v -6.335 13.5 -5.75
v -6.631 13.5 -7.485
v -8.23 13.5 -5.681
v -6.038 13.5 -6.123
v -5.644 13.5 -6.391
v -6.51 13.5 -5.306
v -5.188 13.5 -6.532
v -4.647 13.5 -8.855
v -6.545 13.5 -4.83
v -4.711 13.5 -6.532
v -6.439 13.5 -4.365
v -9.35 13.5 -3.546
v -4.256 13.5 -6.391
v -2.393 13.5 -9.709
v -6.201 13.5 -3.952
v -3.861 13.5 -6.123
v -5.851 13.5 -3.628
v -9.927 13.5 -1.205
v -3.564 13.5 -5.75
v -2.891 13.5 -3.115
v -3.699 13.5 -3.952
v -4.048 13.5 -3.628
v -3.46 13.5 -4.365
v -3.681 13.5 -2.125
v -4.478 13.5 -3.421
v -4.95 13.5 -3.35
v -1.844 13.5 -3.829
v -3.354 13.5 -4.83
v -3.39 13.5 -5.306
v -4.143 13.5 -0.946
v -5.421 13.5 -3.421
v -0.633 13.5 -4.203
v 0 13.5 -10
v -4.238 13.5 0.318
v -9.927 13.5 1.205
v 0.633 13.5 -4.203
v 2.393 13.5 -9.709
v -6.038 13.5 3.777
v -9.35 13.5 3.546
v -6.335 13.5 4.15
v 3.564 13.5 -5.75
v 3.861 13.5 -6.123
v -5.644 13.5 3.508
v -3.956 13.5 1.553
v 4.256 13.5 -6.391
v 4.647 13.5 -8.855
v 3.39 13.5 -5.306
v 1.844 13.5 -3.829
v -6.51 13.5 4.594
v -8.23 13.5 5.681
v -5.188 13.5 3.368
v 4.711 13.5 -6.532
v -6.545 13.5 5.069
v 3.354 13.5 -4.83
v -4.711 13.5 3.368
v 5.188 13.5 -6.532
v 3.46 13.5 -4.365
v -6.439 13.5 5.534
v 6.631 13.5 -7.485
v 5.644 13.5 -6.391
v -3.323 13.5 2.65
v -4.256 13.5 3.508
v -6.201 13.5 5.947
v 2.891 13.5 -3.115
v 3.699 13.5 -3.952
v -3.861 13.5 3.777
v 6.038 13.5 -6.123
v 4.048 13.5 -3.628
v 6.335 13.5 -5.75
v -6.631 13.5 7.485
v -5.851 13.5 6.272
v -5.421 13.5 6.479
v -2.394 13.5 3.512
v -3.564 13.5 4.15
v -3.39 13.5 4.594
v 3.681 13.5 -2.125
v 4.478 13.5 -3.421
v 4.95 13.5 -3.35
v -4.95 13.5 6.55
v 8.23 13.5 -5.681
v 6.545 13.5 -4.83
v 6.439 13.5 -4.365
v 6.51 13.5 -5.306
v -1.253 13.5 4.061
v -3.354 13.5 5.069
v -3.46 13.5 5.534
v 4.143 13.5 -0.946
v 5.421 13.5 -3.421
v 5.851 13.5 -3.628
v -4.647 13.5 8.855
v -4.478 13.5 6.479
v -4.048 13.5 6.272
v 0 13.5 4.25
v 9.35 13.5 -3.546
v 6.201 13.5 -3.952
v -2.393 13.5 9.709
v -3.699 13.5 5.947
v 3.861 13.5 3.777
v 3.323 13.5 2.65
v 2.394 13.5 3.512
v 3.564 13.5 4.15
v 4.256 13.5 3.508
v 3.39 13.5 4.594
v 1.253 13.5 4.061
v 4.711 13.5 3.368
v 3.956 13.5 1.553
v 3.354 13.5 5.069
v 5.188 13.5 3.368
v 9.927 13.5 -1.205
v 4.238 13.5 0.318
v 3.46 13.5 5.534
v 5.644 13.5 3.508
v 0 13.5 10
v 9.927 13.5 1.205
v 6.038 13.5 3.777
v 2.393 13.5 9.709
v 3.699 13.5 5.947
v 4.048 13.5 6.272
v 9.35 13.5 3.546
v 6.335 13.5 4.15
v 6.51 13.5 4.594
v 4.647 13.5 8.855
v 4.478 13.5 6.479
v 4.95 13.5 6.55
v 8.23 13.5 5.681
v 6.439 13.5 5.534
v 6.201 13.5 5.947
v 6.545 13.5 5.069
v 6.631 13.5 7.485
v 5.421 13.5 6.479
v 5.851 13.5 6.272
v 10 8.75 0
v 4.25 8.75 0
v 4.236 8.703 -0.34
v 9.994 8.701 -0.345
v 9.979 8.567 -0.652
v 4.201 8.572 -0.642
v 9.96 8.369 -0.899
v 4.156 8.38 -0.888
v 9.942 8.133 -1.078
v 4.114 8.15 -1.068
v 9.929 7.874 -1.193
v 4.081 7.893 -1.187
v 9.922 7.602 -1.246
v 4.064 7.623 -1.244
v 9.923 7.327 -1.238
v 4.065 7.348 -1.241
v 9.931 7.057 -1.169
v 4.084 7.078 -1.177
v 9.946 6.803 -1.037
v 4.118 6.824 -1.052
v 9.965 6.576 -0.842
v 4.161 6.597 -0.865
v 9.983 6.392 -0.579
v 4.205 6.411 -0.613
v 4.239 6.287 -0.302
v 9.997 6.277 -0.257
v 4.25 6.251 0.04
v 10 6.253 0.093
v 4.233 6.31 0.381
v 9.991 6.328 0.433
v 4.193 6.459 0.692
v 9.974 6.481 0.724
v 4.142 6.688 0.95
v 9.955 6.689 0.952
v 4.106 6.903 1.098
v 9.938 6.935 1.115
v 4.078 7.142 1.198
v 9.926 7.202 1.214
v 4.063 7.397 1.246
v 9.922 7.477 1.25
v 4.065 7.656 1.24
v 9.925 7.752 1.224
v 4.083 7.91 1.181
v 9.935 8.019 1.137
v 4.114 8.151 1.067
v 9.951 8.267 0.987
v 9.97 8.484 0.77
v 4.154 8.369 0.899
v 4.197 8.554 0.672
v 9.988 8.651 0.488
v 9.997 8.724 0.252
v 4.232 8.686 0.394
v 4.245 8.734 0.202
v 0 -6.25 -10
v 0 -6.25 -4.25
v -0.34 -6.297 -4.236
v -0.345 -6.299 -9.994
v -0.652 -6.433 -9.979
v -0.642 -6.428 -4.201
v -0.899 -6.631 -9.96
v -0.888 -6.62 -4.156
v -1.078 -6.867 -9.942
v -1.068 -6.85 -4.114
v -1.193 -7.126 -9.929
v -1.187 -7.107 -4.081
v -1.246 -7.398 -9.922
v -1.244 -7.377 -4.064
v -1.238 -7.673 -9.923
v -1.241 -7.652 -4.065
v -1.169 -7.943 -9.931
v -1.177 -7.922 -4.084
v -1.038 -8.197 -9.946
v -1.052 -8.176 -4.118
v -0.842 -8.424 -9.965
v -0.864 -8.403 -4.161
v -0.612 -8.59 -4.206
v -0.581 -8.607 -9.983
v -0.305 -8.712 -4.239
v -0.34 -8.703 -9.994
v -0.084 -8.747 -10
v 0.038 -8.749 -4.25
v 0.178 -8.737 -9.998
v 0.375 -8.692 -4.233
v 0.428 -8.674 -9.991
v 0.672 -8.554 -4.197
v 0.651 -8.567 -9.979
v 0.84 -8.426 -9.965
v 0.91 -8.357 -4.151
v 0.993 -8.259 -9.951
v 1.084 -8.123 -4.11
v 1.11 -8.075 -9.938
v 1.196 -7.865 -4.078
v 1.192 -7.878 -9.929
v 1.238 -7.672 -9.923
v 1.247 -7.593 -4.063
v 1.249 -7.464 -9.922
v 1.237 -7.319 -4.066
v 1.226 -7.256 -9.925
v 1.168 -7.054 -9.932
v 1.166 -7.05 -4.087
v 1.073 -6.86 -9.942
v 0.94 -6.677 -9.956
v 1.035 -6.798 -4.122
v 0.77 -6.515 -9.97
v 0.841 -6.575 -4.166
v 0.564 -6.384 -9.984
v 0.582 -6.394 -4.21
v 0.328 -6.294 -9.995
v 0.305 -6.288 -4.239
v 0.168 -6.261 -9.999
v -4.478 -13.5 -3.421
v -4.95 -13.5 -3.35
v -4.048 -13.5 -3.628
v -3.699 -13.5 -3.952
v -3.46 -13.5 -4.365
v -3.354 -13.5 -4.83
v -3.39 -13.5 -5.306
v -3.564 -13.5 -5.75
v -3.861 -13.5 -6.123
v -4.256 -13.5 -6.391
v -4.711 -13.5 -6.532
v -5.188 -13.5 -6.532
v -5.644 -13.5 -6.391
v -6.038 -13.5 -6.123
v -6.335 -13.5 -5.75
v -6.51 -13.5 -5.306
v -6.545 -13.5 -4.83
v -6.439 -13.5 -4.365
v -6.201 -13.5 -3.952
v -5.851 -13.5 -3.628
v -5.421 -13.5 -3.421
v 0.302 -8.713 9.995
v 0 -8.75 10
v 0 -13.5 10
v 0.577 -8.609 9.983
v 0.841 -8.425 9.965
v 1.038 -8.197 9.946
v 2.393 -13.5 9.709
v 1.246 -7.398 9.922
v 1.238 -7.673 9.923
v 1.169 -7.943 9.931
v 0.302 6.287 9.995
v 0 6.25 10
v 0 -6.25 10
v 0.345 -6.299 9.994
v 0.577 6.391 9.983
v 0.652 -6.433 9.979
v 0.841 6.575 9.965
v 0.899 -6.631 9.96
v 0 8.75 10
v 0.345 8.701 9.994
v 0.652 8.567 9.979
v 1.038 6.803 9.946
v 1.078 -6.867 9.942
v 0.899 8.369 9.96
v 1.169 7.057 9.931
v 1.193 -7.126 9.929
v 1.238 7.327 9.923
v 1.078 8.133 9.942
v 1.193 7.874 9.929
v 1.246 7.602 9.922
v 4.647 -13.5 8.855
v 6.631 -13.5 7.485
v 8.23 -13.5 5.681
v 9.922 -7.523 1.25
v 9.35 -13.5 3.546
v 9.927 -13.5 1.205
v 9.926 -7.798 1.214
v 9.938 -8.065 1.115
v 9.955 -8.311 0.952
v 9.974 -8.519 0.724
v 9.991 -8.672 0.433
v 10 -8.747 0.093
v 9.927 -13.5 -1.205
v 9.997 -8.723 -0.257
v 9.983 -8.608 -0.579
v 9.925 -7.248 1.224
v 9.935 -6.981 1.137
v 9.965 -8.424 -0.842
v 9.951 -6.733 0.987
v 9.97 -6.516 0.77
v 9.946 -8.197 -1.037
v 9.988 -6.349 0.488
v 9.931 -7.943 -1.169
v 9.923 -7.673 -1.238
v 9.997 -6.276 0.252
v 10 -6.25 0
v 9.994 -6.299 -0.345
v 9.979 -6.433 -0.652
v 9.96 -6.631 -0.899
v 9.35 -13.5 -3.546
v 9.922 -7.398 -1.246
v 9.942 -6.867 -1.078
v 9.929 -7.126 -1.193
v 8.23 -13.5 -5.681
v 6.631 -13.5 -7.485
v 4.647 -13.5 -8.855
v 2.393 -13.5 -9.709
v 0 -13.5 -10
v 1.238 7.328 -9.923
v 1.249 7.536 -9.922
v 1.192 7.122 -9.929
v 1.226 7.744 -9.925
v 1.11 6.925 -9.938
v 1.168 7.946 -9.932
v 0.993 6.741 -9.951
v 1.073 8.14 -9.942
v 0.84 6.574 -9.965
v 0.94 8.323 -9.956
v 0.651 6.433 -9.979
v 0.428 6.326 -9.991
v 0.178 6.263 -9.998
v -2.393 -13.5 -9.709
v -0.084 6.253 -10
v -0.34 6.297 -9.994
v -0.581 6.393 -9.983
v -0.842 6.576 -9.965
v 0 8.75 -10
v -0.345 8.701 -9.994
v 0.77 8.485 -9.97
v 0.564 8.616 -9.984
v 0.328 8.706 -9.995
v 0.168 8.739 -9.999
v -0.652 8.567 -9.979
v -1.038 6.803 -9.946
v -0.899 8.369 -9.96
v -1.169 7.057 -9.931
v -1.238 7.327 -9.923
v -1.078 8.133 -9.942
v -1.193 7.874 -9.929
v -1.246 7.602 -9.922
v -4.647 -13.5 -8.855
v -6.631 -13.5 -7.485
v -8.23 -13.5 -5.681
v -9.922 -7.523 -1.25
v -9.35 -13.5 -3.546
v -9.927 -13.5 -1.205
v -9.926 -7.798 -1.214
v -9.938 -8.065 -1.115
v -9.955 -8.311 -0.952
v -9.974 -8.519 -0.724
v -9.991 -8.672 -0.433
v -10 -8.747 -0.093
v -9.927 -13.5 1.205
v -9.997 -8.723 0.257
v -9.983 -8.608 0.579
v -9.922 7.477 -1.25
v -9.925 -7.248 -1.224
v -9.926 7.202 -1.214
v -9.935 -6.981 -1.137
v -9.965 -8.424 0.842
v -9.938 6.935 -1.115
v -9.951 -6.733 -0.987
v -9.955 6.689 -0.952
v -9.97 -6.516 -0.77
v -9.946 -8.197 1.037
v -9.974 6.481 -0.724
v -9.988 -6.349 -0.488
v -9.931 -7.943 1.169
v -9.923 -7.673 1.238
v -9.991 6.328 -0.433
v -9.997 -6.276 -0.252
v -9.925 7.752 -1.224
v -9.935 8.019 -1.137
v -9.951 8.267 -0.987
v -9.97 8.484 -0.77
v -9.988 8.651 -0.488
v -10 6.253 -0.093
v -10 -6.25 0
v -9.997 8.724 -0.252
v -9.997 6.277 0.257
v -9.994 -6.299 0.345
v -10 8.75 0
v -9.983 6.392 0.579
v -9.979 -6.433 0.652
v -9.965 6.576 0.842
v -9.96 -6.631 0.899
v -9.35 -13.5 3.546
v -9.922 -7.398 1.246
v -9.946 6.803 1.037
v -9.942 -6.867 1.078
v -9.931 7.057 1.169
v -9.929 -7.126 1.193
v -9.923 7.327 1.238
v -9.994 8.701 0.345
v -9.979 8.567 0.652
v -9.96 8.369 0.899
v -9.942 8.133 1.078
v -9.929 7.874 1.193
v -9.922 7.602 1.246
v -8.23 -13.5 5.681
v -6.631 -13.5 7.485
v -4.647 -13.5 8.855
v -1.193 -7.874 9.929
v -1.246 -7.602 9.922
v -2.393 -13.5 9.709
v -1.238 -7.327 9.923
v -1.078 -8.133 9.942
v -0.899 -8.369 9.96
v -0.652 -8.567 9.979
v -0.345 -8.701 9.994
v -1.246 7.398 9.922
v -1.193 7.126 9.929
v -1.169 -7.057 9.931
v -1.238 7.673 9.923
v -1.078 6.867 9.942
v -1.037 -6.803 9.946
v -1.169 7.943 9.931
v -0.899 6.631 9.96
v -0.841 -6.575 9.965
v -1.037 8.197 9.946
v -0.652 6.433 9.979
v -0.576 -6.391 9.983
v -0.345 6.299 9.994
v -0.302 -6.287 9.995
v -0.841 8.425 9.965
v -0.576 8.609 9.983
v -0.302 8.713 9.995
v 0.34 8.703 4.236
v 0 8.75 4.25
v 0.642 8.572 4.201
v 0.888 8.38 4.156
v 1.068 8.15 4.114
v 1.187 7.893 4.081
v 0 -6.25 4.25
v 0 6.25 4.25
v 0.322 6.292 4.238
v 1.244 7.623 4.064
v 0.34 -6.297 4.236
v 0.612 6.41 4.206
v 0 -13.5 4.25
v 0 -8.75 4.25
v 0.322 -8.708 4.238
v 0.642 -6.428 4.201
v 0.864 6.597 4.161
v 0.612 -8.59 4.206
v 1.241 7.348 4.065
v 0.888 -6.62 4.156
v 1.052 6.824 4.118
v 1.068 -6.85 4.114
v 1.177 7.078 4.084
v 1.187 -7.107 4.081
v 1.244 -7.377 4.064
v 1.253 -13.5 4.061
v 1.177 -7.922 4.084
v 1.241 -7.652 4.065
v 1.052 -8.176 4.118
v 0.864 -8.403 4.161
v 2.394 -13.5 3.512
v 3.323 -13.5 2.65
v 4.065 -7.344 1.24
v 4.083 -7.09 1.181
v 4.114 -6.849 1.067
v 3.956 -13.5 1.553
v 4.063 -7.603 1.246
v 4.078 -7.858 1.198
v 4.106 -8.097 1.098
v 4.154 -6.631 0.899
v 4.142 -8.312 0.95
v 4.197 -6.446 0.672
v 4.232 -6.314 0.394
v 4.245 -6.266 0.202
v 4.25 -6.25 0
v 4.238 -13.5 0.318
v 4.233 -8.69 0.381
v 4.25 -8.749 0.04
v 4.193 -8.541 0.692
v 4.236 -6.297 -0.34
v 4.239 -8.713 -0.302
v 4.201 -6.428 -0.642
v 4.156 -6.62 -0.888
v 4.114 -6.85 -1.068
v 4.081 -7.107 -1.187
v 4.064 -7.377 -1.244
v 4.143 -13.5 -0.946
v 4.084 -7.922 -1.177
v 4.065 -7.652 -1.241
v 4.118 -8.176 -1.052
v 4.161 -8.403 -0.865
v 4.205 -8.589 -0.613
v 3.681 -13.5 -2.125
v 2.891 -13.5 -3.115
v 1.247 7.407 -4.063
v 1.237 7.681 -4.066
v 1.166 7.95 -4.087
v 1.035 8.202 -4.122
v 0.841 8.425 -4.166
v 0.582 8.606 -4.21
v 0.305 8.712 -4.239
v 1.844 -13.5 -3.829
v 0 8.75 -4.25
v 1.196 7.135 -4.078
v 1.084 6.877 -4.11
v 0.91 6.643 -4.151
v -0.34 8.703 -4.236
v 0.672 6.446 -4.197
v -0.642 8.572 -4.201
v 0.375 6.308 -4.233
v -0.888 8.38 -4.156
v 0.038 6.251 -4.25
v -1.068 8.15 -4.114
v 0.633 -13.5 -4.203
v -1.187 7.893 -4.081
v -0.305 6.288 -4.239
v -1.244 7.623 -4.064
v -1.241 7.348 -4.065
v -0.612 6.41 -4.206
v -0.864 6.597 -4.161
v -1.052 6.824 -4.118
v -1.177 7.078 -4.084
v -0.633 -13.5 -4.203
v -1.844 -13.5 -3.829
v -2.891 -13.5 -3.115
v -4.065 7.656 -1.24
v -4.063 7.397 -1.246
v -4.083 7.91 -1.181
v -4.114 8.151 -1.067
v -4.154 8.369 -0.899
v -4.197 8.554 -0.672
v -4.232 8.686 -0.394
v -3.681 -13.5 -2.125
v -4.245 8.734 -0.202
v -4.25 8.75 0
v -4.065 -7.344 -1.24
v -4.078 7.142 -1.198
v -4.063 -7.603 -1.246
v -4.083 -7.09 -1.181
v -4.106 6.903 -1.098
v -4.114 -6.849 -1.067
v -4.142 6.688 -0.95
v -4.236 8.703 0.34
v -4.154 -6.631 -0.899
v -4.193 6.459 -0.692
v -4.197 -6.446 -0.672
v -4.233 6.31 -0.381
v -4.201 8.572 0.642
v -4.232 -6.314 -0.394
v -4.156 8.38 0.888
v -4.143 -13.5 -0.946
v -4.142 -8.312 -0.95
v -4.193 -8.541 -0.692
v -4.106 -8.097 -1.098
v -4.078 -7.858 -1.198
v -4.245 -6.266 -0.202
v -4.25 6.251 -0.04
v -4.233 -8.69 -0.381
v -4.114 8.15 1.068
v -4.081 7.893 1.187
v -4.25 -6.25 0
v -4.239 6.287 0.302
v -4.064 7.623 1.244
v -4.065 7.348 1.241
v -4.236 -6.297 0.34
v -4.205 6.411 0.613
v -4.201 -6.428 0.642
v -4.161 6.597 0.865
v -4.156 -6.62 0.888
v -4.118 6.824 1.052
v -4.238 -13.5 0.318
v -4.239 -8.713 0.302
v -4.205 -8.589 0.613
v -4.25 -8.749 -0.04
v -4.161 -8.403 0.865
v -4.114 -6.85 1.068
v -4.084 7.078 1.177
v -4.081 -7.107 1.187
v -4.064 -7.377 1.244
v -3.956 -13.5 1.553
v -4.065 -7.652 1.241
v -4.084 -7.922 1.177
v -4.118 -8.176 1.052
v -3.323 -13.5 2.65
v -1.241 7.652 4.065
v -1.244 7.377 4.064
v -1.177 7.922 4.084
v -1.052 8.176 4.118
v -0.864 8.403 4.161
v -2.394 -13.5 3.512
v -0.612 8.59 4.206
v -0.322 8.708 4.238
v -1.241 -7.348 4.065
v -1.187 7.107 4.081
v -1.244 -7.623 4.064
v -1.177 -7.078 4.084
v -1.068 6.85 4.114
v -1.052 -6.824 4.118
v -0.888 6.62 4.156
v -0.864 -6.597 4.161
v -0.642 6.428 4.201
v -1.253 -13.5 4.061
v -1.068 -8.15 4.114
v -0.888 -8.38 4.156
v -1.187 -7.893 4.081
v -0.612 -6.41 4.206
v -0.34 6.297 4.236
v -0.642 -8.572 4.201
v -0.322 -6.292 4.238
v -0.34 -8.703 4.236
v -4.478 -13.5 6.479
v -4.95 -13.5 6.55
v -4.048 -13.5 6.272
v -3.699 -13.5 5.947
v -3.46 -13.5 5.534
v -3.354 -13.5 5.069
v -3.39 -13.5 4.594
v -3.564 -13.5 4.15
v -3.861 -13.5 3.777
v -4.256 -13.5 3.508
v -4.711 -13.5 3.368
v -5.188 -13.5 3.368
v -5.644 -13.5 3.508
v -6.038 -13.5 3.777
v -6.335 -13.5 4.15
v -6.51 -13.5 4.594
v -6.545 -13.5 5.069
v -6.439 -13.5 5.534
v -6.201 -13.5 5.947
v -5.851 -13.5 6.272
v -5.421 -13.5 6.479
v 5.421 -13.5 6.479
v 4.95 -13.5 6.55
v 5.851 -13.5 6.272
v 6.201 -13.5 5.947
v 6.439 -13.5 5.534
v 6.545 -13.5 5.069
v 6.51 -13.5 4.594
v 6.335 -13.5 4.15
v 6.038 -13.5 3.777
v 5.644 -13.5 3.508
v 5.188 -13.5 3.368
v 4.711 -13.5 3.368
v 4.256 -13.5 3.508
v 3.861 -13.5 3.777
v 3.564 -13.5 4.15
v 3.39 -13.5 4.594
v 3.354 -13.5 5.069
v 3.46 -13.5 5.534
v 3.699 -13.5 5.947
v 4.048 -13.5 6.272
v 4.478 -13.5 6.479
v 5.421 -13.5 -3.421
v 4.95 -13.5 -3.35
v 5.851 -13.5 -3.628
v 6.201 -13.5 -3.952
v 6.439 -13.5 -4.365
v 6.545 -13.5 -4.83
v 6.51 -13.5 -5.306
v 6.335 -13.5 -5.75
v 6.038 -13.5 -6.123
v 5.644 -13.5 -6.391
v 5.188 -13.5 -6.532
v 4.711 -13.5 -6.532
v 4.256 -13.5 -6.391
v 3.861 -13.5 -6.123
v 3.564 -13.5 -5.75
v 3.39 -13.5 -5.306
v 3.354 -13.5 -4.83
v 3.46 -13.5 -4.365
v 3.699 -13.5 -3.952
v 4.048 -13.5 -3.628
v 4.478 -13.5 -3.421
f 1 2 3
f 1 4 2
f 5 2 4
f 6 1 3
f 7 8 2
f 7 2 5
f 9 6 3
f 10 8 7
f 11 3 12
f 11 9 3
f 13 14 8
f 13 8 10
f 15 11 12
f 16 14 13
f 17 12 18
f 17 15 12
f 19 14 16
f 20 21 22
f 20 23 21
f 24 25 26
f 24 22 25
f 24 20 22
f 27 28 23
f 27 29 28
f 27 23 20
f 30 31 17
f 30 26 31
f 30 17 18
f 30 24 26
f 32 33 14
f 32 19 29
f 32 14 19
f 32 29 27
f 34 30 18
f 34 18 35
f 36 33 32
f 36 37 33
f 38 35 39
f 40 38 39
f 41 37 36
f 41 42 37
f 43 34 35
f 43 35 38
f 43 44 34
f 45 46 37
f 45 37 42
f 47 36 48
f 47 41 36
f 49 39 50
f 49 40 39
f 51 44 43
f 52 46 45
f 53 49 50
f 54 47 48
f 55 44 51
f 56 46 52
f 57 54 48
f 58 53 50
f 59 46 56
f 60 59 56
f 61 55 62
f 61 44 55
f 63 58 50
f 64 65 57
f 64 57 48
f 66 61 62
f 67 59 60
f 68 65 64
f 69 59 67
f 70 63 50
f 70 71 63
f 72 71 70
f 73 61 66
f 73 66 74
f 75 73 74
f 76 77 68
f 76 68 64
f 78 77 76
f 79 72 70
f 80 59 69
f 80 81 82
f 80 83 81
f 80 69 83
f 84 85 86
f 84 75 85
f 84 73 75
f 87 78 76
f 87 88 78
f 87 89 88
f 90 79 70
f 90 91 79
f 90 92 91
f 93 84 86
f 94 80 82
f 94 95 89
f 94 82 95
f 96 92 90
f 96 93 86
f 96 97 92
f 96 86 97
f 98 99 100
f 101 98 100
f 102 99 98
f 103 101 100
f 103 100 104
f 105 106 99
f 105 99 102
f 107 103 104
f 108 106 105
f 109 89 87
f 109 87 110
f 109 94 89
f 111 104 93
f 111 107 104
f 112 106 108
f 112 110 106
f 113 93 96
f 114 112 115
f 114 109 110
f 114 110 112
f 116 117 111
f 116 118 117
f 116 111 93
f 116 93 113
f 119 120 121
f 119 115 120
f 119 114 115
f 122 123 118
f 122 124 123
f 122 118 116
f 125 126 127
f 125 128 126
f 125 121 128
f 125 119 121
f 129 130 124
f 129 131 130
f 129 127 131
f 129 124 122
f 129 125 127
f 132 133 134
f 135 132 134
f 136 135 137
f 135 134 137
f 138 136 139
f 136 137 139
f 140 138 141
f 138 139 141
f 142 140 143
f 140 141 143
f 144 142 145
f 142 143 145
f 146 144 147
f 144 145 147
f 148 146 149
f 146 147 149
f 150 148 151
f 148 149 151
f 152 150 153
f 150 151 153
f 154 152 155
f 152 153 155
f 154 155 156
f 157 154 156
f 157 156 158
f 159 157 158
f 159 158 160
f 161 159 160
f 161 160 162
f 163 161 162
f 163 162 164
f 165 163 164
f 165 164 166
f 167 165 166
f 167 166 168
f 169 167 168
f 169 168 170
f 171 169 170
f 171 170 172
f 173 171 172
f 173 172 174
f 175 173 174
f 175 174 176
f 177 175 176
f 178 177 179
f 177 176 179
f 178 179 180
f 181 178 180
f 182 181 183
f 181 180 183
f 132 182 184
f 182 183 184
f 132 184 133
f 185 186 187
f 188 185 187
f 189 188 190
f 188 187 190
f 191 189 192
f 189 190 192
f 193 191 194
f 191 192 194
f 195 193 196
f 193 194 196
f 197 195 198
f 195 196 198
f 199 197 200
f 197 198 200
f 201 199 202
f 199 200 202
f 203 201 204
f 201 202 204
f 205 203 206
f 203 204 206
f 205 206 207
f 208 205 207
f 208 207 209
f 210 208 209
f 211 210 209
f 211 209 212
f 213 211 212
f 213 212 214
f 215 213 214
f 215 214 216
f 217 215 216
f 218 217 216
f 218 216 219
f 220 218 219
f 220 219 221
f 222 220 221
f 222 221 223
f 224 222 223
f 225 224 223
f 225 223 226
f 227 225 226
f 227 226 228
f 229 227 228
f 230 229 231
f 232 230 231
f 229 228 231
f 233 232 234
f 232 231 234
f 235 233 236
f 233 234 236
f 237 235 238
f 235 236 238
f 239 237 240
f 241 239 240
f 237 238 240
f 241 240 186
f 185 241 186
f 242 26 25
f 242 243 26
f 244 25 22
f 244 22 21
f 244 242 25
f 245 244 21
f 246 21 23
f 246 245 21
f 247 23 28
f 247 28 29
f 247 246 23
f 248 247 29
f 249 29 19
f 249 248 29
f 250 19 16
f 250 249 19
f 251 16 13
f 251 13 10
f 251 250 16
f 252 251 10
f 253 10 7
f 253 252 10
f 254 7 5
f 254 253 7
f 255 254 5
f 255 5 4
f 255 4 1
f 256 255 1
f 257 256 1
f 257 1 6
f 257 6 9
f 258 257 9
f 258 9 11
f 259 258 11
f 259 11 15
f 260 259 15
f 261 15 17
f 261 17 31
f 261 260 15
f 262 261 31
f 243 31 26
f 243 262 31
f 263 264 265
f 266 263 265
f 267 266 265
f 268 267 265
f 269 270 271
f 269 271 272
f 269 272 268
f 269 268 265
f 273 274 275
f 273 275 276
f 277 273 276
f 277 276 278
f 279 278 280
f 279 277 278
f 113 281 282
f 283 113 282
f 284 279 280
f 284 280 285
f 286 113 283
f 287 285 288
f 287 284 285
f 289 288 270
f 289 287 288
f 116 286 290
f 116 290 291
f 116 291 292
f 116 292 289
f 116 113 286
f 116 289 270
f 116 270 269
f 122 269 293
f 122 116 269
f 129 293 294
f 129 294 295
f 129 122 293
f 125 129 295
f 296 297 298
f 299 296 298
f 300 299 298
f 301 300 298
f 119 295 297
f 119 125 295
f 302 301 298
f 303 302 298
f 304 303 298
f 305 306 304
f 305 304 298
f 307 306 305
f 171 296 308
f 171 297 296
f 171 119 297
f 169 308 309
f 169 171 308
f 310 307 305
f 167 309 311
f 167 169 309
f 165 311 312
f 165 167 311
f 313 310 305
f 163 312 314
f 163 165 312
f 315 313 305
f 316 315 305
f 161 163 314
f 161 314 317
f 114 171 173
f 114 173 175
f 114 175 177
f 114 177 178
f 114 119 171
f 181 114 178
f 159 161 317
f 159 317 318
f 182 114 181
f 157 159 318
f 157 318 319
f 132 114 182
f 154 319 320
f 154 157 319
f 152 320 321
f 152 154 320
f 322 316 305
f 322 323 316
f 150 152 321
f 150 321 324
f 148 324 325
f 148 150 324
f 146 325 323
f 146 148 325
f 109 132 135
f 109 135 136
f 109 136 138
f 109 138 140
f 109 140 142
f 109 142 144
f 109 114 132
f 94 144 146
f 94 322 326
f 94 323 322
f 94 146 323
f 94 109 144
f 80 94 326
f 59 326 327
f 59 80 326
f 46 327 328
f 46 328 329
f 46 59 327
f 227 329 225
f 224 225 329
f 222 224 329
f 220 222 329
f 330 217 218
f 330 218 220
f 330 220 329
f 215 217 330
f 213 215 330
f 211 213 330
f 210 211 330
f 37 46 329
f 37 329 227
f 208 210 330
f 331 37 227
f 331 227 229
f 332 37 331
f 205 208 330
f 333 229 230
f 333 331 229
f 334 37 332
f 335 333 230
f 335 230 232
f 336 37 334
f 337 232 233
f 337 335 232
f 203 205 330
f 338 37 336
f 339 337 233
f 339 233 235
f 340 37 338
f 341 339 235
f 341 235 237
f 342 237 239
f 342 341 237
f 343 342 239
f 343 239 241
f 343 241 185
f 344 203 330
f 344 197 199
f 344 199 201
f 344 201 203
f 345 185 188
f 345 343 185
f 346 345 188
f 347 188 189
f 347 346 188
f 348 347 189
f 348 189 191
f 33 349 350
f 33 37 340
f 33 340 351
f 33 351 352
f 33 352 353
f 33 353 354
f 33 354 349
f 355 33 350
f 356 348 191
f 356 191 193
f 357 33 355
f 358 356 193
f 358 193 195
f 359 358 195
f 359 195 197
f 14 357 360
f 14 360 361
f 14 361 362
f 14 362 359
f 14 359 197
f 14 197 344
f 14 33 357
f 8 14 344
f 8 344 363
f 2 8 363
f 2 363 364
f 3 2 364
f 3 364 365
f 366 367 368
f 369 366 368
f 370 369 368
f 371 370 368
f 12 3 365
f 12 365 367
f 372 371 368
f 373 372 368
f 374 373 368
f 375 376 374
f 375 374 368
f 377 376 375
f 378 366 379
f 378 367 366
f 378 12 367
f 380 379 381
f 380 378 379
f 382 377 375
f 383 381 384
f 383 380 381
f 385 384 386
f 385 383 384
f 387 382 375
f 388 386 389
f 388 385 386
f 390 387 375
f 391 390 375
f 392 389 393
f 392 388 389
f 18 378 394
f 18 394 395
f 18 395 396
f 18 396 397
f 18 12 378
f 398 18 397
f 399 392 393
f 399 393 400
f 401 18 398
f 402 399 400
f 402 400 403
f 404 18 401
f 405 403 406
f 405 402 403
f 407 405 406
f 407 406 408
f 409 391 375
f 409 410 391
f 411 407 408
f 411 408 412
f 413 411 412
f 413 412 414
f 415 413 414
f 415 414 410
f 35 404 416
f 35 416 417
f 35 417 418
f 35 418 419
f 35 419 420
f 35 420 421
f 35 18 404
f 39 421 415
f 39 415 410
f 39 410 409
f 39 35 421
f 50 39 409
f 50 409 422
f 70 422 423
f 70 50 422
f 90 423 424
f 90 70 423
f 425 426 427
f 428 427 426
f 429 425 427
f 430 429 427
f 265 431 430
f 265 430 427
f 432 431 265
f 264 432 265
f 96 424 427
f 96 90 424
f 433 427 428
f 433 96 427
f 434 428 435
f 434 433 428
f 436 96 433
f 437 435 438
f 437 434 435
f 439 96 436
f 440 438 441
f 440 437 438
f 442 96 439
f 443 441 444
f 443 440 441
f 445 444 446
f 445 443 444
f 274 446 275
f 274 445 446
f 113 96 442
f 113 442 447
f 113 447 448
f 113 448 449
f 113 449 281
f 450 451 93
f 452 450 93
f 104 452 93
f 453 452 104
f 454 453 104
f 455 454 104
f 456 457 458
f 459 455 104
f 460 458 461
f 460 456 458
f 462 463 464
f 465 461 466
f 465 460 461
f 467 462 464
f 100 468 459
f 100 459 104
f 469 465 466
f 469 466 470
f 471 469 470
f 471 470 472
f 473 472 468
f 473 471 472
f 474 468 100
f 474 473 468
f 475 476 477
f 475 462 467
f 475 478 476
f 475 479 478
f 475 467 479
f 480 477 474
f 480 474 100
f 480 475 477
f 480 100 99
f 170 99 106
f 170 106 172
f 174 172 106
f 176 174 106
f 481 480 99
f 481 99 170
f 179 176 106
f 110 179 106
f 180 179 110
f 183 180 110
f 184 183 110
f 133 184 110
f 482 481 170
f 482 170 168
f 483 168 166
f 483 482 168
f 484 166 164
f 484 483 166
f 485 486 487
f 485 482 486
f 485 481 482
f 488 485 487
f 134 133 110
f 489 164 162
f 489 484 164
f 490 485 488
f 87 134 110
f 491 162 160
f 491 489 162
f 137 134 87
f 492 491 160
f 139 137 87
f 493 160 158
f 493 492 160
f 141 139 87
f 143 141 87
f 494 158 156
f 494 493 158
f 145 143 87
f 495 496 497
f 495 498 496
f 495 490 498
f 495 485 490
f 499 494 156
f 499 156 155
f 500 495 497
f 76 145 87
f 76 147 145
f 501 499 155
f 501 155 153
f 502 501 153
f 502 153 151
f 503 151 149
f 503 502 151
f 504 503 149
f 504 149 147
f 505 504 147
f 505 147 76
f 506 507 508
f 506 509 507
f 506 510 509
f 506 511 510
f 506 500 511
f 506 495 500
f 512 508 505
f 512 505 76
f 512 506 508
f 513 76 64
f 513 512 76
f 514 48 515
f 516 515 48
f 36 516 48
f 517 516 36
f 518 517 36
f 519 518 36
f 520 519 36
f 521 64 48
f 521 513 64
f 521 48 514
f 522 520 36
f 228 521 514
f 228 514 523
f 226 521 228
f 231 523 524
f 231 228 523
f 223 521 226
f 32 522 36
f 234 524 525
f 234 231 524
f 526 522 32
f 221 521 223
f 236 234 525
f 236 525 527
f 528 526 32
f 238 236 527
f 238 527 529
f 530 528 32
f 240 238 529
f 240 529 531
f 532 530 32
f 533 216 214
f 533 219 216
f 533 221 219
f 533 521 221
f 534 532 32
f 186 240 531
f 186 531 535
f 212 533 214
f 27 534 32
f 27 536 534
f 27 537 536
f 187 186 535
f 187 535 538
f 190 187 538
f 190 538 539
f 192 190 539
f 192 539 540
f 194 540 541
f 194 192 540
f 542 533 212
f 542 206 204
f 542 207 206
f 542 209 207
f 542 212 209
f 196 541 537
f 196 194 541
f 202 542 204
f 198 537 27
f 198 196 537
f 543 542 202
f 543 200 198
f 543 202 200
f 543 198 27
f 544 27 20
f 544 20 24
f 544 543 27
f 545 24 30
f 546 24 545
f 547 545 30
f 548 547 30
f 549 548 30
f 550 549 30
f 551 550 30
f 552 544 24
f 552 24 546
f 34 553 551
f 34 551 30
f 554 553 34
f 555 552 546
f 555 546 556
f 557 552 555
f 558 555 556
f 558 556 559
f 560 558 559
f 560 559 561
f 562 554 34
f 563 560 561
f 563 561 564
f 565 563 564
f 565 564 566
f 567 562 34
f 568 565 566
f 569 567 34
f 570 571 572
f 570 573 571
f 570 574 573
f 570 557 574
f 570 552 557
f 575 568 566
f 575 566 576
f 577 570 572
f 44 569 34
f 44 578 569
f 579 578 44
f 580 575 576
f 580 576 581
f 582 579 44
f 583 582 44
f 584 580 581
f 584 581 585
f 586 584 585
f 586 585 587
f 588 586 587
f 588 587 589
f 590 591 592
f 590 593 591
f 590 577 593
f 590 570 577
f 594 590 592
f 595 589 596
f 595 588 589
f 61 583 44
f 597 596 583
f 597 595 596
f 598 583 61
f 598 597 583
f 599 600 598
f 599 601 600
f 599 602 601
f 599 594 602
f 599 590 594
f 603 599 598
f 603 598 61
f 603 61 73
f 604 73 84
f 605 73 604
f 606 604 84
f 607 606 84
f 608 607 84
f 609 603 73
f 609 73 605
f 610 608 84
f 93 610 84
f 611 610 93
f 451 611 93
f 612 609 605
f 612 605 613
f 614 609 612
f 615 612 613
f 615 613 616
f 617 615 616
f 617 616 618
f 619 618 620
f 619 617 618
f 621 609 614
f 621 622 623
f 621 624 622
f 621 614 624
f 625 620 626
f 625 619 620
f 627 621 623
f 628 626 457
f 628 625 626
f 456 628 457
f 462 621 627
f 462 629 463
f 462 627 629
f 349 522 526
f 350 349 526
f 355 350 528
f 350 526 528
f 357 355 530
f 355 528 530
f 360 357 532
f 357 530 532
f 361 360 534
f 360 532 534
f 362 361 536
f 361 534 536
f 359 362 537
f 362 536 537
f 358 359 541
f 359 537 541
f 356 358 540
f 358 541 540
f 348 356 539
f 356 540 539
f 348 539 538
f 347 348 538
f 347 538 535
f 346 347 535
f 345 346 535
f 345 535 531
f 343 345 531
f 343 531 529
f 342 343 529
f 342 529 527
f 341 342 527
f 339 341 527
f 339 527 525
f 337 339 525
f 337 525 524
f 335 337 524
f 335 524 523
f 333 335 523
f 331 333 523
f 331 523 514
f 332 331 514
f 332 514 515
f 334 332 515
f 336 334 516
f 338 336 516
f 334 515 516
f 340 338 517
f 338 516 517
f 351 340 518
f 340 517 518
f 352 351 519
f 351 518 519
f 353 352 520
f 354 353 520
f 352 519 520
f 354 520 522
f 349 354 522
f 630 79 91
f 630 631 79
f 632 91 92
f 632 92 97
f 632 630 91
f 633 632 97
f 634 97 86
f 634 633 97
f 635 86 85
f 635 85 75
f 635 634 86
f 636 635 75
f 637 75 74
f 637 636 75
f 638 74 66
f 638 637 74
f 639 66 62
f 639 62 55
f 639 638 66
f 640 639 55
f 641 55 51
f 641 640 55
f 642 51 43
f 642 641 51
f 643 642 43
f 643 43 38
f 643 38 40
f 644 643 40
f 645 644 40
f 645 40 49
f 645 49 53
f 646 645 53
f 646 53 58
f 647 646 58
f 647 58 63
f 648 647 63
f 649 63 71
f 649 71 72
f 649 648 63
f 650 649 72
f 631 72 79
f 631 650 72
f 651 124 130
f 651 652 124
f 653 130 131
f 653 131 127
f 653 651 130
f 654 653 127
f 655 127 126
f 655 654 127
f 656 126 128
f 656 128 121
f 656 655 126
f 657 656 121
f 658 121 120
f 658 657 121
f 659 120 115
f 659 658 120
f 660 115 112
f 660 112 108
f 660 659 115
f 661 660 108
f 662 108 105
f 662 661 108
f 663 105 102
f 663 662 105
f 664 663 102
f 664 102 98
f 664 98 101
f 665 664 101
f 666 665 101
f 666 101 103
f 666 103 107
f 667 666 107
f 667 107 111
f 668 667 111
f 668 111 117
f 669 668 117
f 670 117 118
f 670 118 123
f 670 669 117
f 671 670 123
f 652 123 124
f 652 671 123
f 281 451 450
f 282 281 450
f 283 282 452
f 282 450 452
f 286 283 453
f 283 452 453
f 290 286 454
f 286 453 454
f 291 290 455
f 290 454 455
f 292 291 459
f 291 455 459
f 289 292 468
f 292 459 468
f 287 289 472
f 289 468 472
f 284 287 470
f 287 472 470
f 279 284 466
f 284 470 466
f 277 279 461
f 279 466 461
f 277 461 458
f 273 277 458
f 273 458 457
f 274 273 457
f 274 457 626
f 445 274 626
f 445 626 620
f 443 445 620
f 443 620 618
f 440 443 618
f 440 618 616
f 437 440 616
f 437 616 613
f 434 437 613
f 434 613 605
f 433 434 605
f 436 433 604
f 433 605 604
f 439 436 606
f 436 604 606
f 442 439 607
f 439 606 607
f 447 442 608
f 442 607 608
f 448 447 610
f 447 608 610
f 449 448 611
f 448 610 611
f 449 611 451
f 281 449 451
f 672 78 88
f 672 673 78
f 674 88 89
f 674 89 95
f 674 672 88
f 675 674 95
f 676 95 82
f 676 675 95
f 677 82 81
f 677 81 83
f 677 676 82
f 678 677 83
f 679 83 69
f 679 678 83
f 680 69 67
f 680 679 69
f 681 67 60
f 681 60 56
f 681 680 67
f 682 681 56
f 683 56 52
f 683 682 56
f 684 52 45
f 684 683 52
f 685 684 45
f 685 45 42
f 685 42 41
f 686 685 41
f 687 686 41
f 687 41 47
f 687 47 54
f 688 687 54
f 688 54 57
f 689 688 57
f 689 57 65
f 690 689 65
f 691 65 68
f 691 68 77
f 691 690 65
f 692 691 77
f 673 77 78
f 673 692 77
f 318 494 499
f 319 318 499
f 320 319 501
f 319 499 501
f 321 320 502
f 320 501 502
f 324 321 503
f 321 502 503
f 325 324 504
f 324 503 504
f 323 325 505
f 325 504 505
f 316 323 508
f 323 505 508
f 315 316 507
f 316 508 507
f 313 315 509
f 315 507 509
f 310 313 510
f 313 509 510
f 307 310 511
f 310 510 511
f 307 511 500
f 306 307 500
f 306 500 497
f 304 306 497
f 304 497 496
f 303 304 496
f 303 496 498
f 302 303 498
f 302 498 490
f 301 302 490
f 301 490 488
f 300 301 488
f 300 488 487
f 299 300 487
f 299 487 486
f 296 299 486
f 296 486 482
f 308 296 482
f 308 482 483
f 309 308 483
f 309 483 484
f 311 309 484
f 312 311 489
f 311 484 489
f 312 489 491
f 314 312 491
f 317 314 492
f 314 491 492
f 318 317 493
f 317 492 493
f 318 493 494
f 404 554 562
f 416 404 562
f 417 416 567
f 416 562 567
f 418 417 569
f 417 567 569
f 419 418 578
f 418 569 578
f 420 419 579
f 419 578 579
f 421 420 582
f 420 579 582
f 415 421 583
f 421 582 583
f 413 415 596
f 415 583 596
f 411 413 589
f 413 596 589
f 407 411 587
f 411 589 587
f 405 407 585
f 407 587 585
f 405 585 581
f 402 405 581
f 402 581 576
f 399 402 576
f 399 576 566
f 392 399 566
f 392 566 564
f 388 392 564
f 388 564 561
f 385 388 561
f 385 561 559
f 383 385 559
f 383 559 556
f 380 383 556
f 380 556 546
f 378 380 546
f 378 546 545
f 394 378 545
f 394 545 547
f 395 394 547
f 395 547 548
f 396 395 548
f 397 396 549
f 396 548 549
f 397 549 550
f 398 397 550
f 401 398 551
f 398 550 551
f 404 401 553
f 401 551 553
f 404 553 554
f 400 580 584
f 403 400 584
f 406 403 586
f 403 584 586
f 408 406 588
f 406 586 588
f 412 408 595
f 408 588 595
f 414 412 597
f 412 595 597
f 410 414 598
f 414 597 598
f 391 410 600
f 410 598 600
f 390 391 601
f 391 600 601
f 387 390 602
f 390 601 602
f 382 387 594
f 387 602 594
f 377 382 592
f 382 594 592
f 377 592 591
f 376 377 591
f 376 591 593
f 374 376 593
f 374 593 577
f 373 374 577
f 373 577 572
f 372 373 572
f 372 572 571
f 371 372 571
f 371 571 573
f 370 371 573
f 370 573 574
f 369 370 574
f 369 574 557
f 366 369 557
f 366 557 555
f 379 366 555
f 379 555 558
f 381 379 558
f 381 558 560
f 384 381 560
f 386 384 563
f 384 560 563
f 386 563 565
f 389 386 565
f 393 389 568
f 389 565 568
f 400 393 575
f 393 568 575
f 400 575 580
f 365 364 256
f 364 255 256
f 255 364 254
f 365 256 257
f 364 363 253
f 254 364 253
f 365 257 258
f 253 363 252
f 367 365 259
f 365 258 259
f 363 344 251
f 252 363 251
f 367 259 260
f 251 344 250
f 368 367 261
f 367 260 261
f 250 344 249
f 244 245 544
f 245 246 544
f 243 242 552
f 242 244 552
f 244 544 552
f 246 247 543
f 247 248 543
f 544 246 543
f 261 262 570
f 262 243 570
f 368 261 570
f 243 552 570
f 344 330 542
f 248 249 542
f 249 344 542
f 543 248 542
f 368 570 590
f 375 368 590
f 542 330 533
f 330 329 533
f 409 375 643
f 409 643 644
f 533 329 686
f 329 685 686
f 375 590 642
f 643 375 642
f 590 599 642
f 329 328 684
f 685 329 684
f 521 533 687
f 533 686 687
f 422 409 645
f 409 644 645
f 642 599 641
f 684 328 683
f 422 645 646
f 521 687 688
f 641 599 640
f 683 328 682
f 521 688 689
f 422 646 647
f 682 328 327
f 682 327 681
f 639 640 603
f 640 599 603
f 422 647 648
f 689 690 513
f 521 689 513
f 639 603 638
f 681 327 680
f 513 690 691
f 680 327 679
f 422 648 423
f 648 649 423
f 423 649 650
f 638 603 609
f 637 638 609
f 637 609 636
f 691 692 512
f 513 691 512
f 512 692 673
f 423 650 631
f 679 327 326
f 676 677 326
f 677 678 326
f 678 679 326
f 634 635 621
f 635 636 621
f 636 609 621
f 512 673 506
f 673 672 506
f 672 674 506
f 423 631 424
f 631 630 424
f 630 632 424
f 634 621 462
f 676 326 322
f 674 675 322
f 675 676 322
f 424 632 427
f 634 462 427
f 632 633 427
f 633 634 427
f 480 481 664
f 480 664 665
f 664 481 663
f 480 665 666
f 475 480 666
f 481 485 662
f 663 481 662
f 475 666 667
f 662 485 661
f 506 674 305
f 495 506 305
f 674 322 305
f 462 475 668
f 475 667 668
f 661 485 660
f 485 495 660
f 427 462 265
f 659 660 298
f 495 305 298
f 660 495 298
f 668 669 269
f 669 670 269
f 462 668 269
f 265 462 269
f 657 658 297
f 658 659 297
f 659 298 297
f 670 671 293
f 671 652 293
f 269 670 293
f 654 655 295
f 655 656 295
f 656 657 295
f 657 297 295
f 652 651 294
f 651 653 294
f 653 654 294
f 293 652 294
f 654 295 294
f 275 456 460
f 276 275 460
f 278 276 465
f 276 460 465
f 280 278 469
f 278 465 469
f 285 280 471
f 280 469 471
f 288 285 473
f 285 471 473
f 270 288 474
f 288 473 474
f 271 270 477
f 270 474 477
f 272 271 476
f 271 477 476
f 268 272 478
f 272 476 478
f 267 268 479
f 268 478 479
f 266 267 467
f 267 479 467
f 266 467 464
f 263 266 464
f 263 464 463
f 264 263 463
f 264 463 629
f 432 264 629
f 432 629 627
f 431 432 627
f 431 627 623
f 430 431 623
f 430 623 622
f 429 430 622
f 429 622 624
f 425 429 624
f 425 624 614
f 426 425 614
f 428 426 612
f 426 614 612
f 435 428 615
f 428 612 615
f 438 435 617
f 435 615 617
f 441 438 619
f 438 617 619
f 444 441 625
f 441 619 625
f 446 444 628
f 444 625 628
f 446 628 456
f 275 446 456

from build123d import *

# Parameters (mm, degrees)
SKETCH_1_R               = 10
SKETCH_1_R_2             = 4.25
SKETCH_1_R_3             = 1.6
EXTRUDE_1_DEPTH          = 13.5
SKETCH_2_R               = 1.25
CUT_EXTRUDE_1_DEPTH      = 20.551214796
PATTERN_CIRCULAR_1_COUNT = 4


with BuildPart() as part:
    # 草图1 → 凸台-拉伸1 (new, symmetric)
    with BuildSketch(Plane(origin=(0, 0, 0), x_dir=(1, 0, 0), z_dir=(0, 1, 0))):
        with Locations(Location((0, 0, 0), (0, 0, 270))):
            Circle(SKETCH_1_R)
        with Locations(Location((0, 0, 0), (0, 0, 270))):
            Circle(SKETCH_1_R_2, mode=Mode.SUBTRACT)
        with Locations(Location((-4.949747468, 4.949747468, 0), (0, 0, 270))):
            Circle(SKETCH_1_R_3, mode=Mode.SUBTRACT)
        with Locations(Location((-4.949747468, -4.949747468, 0), (0, 0, 270))):
            Circle(SKETCH_1_R_3, mode=Mode.SUBTRACT)
        with Locations(Location((4.949747468, -4.949747468, 0), (0, 0, 270))):
            Circle(SKETCH_1_R_3, mode=Mode.SUBTRACT)
        with Locations(Location((4.949747468, 4.949747468, 0), (0, 0, 270))):
            Circle(SKETCH_1_R_3, mode=Mode.SUBTRACT)
    extrude(amount=EXTRUDE_1_DEPTH, both=True)

    # 草图2 → 切除-拉伸1 (cut, through all)
    with BuildSketch(Plane.XY):
        with Locations(Location((0, 7.5, 0), (0, 0, 90))):
            Circle(SKETCH_2_R)
        with Locations(Location((0, -7.5, 0), (0, 0, 90))):
            Circle(SKETCH_2_R)
    cut_extrude_1 = extrude(amount=-CUT_EXTRUDE_1_DEPTH, mode=Mode.SUBTRACT)

    # 阵列(圆周)1: 切除-拉伸1 ×4 about axis
    pattern_circular_1_axis = Axis((0, 13.5, 0), (0, 1, 0))
    for i in range(1, PATTERN_CIRCULAR_1_COUNT):
        add(cut_extrude_1.rotate(pattern_circular_1_axis, i * 360 / PATTERN_CIRCULAR_1_COUNT), mode=Mode.SUBTRACT)


solid = part.part
